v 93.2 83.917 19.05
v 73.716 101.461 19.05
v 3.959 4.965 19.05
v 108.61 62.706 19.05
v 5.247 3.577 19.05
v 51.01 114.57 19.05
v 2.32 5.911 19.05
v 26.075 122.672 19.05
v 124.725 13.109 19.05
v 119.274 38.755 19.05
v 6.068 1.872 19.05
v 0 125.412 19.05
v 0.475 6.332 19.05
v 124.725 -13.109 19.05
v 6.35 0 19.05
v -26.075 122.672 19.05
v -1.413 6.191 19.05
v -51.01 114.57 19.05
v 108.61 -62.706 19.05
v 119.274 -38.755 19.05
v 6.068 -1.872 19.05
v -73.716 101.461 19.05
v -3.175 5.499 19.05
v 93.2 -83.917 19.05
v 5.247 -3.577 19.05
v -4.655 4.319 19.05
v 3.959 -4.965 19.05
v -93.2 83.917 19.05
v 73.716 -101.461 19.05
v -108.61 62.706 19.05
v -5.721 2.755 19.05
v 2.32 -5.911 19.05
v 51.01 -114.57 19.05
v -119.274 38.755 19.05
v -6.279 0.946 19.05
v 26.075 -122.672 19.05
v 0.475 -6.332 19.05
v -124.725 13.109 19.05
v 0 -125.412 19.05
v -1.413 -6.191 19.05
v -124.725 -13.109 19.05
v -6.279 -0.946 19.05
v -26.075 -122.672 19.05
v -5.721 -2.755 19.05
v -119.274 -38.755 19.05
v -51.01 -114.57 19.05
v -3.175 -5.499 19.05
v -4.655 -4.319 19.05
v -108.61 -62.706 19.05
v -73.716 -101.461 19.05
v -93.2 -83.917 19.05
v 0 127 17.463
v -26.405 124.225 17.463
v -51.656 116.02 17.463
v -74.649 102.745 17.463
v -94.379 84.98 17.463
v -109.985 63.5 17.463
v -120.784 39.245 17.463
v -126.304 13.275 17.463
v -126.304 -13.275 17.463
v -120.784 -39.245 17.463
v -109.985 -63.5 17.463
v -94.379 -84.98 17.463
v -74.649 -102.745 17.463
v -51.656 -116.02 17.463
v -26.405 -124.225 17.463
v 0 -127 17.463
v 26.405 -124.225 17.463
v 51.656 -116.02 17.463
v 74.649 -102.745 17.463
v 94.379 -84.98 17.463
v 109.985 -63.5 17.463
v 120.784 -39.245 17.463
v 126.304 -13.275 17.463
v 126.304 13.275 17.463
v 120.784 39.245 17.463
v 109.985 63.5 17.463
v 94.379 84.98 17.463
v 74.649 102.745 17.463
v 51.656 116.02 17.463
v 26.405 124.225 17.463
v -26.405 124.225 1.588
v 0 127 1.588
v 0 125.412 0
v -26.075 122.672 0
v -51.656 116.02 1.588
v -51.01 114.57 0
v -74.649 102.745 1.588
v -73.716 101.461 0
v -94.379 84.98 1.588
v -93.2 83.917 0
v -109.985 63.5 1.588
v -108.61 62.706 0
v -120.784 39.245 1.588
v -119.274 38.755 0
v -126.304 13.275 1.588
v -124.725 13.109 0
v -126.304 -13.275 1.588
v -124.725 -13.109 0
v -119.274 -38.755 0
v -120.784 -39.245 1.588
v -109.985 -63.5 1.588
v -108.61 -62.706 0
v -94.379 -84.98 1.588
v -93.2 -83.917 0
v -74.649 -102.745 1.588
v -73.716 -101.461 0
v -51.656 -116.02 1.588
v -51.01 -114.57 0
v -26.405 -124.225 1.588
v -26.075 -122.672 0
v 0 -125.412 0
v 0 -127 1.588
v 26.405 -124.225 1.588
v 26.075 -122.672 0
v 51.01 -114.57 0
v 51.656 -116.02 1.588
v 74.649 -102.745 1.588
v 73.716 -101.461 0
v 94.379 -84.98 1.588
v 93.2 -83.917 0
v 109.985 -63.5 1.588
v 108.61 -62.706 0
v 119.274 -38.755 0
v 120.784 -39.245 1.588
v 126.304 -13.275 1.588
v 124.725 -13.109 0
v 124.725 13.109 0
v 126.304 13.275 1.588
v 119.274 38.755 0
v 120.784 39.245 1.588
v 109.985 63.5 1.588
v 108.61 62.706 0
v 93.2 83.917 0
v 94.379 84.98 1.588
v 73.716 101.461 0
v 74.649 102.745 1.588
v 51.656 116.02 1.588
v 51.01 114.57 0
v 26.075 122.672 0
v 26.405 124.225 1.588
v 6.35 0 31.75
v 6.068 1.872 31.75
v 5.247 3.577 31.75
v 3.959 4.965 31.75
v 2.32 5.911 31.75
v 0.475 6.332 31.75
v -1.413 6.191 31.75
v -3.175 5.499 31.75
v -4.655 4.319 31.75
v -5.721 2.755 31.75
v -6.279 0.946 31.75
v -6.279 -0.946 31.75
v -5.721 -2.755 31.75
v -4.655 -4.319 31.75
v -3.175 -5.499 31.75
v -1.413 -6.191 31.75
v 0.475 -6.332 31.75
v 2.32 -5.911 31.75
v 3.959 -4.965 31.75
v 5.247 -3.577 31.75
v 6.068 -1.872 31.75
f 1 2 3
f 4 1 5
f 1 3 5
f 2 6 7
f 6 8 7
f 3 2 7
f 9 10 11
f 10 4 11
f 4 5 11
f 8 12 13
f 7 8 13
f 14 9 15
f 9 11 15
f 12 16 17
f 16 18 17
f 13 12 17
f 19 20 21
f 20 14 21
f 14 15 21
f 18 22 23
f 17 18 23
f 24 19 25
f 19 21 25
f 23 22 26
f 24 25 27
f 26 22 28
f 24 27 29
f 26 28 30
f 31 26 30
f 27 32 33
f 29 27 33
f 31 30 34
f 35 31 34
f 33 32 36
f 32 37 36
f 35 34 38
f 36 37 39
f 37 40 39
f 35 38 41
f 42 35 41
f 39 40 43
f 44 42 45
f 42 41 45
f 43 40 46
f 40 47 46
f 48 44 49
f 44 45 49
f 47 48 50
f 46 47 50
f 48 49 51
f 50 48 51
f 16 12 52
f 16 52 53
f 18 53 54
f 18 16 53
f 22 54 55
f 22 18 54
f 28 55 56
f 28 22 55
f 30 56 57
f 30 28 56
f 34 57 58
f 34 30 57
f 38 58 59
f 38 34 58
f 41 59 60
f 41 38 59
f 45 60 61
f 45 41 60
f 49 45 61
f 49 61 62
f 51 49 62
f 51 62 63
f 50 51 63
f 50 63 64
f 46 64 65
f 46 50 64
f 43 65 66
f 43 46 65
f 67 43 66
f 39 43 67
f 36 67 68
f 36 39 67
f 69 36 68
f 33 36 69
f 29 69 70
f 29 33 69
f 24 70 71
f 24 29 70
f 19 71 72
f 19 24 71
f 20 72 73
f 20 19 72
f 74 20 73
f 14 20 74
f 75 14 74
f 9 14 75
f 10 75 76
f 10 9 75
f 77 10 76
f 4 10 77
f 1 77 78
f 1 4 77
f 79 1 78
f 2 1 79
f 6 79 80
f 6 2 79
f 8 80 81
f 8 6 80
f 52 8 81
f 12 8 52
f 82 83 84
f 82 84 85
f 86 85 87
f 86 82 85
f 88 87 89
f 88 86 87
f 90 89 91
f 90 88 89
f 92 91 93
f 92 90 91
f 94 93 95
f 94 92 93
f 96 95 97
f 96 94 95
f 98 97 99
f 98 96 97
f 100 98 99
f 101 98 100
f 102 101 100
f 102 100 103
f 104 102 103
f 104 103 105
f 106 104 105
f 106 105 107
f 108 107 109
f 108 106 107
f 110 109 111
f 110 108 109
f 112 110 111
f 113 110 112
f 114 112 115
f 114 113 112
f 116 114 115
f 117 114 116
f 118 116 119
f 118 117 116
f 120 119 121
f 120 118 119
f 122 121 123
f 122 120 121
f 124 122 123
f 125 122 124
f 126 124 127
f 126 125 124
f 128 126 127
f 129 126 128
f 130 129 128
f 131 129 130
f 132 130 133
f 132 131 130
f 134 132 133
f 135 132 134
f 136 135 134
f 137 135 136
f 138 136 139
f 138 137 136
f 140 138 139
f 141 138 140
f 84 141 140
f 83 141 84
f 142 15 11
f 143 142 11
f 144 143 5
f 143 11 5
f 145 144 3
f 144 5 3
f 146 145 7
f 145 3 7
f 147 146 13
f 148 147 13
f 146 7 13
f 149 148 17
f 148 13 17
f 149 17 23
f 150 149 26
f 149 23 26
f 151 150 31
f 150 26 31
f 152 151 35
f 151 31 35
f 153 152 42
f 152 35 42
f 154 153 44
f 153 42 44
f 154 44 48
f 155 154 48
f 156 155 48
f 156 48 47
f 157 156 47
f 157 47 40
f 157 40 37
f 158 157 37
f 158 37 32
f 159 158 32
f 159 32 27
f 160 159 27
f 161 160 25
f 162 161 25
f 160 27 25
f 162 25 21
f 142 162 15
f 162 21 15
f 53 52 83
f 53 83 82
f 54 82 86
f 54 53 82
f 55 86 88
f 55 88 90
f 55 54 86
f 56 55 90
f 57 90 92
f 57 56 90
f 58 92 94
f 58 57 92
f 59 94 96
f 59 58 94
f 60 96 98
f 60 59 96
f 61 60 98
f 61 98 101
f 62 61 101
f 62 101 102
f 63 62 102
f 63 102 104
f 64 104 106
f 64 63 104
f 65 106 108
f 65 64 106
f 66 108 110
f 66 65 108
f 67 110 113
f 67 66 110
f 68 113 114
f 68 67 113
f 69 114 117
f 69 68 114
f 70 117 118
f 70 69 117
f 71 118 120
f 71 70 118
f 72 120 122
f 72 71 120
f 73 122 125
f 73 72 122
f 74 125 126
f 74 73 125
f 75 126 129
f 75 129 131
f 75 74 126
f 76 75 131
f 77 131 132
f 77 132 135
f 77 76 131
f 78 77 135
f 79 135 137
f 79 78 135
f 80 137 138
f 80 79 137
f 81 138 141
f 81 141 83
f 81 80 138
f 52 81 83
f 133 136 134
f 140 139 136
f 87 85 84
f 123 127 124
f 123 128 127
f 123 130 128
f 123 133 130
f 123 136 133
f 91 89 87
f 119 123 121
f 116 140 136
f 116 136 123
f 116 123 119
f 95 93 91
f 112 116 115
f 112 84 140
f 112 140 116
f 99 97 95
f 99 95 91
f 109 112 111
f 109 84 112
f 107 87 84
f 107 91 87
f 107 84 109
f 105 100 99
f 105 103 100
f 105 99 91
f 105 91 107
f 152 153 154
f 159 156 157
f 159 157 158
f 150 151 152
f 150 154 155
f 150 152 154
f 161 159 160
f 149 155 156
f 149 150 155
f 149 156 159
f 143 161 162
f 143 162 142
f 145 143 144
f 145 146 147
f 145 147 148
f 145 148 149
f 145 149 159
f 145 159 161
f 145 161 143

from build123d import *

# Parameters (mm, degrees)
F0_W     = 127
F0_H     = 19.05
F2_SIZE2 = 1.5875
F2_SIZE  = 1.5875
F3_R     = 6.35
F4_DEPTH = 12.7


with BuildPart() as f1:
    # F0 (on Right) → F1 (revolve)
    with BuildSketch(Plane.YZ):
        with Locations((63.5, 9.525)):
            Rectangle(F0_W, F0_H)
    revolve(axis=Axis((0, 0, 9.525), (0, 0, 1)))

    # F2
    f2_edges = [f1.edges().sort_by_distance(p)[0] for p in [
        (0, -127, 0),
        (0, -127, 19.05),
    ]]
    chamfer(f2_edges, length=F2_SIZE, length2=F2_SIZE2)

    # F3 (on face) → F4 (join)
    with BuildSketch(Plane.XY.offset(19.05)):
        Circle(F3_R)
    extrude(amount=F4_DEPTH)


solid = f1.part
